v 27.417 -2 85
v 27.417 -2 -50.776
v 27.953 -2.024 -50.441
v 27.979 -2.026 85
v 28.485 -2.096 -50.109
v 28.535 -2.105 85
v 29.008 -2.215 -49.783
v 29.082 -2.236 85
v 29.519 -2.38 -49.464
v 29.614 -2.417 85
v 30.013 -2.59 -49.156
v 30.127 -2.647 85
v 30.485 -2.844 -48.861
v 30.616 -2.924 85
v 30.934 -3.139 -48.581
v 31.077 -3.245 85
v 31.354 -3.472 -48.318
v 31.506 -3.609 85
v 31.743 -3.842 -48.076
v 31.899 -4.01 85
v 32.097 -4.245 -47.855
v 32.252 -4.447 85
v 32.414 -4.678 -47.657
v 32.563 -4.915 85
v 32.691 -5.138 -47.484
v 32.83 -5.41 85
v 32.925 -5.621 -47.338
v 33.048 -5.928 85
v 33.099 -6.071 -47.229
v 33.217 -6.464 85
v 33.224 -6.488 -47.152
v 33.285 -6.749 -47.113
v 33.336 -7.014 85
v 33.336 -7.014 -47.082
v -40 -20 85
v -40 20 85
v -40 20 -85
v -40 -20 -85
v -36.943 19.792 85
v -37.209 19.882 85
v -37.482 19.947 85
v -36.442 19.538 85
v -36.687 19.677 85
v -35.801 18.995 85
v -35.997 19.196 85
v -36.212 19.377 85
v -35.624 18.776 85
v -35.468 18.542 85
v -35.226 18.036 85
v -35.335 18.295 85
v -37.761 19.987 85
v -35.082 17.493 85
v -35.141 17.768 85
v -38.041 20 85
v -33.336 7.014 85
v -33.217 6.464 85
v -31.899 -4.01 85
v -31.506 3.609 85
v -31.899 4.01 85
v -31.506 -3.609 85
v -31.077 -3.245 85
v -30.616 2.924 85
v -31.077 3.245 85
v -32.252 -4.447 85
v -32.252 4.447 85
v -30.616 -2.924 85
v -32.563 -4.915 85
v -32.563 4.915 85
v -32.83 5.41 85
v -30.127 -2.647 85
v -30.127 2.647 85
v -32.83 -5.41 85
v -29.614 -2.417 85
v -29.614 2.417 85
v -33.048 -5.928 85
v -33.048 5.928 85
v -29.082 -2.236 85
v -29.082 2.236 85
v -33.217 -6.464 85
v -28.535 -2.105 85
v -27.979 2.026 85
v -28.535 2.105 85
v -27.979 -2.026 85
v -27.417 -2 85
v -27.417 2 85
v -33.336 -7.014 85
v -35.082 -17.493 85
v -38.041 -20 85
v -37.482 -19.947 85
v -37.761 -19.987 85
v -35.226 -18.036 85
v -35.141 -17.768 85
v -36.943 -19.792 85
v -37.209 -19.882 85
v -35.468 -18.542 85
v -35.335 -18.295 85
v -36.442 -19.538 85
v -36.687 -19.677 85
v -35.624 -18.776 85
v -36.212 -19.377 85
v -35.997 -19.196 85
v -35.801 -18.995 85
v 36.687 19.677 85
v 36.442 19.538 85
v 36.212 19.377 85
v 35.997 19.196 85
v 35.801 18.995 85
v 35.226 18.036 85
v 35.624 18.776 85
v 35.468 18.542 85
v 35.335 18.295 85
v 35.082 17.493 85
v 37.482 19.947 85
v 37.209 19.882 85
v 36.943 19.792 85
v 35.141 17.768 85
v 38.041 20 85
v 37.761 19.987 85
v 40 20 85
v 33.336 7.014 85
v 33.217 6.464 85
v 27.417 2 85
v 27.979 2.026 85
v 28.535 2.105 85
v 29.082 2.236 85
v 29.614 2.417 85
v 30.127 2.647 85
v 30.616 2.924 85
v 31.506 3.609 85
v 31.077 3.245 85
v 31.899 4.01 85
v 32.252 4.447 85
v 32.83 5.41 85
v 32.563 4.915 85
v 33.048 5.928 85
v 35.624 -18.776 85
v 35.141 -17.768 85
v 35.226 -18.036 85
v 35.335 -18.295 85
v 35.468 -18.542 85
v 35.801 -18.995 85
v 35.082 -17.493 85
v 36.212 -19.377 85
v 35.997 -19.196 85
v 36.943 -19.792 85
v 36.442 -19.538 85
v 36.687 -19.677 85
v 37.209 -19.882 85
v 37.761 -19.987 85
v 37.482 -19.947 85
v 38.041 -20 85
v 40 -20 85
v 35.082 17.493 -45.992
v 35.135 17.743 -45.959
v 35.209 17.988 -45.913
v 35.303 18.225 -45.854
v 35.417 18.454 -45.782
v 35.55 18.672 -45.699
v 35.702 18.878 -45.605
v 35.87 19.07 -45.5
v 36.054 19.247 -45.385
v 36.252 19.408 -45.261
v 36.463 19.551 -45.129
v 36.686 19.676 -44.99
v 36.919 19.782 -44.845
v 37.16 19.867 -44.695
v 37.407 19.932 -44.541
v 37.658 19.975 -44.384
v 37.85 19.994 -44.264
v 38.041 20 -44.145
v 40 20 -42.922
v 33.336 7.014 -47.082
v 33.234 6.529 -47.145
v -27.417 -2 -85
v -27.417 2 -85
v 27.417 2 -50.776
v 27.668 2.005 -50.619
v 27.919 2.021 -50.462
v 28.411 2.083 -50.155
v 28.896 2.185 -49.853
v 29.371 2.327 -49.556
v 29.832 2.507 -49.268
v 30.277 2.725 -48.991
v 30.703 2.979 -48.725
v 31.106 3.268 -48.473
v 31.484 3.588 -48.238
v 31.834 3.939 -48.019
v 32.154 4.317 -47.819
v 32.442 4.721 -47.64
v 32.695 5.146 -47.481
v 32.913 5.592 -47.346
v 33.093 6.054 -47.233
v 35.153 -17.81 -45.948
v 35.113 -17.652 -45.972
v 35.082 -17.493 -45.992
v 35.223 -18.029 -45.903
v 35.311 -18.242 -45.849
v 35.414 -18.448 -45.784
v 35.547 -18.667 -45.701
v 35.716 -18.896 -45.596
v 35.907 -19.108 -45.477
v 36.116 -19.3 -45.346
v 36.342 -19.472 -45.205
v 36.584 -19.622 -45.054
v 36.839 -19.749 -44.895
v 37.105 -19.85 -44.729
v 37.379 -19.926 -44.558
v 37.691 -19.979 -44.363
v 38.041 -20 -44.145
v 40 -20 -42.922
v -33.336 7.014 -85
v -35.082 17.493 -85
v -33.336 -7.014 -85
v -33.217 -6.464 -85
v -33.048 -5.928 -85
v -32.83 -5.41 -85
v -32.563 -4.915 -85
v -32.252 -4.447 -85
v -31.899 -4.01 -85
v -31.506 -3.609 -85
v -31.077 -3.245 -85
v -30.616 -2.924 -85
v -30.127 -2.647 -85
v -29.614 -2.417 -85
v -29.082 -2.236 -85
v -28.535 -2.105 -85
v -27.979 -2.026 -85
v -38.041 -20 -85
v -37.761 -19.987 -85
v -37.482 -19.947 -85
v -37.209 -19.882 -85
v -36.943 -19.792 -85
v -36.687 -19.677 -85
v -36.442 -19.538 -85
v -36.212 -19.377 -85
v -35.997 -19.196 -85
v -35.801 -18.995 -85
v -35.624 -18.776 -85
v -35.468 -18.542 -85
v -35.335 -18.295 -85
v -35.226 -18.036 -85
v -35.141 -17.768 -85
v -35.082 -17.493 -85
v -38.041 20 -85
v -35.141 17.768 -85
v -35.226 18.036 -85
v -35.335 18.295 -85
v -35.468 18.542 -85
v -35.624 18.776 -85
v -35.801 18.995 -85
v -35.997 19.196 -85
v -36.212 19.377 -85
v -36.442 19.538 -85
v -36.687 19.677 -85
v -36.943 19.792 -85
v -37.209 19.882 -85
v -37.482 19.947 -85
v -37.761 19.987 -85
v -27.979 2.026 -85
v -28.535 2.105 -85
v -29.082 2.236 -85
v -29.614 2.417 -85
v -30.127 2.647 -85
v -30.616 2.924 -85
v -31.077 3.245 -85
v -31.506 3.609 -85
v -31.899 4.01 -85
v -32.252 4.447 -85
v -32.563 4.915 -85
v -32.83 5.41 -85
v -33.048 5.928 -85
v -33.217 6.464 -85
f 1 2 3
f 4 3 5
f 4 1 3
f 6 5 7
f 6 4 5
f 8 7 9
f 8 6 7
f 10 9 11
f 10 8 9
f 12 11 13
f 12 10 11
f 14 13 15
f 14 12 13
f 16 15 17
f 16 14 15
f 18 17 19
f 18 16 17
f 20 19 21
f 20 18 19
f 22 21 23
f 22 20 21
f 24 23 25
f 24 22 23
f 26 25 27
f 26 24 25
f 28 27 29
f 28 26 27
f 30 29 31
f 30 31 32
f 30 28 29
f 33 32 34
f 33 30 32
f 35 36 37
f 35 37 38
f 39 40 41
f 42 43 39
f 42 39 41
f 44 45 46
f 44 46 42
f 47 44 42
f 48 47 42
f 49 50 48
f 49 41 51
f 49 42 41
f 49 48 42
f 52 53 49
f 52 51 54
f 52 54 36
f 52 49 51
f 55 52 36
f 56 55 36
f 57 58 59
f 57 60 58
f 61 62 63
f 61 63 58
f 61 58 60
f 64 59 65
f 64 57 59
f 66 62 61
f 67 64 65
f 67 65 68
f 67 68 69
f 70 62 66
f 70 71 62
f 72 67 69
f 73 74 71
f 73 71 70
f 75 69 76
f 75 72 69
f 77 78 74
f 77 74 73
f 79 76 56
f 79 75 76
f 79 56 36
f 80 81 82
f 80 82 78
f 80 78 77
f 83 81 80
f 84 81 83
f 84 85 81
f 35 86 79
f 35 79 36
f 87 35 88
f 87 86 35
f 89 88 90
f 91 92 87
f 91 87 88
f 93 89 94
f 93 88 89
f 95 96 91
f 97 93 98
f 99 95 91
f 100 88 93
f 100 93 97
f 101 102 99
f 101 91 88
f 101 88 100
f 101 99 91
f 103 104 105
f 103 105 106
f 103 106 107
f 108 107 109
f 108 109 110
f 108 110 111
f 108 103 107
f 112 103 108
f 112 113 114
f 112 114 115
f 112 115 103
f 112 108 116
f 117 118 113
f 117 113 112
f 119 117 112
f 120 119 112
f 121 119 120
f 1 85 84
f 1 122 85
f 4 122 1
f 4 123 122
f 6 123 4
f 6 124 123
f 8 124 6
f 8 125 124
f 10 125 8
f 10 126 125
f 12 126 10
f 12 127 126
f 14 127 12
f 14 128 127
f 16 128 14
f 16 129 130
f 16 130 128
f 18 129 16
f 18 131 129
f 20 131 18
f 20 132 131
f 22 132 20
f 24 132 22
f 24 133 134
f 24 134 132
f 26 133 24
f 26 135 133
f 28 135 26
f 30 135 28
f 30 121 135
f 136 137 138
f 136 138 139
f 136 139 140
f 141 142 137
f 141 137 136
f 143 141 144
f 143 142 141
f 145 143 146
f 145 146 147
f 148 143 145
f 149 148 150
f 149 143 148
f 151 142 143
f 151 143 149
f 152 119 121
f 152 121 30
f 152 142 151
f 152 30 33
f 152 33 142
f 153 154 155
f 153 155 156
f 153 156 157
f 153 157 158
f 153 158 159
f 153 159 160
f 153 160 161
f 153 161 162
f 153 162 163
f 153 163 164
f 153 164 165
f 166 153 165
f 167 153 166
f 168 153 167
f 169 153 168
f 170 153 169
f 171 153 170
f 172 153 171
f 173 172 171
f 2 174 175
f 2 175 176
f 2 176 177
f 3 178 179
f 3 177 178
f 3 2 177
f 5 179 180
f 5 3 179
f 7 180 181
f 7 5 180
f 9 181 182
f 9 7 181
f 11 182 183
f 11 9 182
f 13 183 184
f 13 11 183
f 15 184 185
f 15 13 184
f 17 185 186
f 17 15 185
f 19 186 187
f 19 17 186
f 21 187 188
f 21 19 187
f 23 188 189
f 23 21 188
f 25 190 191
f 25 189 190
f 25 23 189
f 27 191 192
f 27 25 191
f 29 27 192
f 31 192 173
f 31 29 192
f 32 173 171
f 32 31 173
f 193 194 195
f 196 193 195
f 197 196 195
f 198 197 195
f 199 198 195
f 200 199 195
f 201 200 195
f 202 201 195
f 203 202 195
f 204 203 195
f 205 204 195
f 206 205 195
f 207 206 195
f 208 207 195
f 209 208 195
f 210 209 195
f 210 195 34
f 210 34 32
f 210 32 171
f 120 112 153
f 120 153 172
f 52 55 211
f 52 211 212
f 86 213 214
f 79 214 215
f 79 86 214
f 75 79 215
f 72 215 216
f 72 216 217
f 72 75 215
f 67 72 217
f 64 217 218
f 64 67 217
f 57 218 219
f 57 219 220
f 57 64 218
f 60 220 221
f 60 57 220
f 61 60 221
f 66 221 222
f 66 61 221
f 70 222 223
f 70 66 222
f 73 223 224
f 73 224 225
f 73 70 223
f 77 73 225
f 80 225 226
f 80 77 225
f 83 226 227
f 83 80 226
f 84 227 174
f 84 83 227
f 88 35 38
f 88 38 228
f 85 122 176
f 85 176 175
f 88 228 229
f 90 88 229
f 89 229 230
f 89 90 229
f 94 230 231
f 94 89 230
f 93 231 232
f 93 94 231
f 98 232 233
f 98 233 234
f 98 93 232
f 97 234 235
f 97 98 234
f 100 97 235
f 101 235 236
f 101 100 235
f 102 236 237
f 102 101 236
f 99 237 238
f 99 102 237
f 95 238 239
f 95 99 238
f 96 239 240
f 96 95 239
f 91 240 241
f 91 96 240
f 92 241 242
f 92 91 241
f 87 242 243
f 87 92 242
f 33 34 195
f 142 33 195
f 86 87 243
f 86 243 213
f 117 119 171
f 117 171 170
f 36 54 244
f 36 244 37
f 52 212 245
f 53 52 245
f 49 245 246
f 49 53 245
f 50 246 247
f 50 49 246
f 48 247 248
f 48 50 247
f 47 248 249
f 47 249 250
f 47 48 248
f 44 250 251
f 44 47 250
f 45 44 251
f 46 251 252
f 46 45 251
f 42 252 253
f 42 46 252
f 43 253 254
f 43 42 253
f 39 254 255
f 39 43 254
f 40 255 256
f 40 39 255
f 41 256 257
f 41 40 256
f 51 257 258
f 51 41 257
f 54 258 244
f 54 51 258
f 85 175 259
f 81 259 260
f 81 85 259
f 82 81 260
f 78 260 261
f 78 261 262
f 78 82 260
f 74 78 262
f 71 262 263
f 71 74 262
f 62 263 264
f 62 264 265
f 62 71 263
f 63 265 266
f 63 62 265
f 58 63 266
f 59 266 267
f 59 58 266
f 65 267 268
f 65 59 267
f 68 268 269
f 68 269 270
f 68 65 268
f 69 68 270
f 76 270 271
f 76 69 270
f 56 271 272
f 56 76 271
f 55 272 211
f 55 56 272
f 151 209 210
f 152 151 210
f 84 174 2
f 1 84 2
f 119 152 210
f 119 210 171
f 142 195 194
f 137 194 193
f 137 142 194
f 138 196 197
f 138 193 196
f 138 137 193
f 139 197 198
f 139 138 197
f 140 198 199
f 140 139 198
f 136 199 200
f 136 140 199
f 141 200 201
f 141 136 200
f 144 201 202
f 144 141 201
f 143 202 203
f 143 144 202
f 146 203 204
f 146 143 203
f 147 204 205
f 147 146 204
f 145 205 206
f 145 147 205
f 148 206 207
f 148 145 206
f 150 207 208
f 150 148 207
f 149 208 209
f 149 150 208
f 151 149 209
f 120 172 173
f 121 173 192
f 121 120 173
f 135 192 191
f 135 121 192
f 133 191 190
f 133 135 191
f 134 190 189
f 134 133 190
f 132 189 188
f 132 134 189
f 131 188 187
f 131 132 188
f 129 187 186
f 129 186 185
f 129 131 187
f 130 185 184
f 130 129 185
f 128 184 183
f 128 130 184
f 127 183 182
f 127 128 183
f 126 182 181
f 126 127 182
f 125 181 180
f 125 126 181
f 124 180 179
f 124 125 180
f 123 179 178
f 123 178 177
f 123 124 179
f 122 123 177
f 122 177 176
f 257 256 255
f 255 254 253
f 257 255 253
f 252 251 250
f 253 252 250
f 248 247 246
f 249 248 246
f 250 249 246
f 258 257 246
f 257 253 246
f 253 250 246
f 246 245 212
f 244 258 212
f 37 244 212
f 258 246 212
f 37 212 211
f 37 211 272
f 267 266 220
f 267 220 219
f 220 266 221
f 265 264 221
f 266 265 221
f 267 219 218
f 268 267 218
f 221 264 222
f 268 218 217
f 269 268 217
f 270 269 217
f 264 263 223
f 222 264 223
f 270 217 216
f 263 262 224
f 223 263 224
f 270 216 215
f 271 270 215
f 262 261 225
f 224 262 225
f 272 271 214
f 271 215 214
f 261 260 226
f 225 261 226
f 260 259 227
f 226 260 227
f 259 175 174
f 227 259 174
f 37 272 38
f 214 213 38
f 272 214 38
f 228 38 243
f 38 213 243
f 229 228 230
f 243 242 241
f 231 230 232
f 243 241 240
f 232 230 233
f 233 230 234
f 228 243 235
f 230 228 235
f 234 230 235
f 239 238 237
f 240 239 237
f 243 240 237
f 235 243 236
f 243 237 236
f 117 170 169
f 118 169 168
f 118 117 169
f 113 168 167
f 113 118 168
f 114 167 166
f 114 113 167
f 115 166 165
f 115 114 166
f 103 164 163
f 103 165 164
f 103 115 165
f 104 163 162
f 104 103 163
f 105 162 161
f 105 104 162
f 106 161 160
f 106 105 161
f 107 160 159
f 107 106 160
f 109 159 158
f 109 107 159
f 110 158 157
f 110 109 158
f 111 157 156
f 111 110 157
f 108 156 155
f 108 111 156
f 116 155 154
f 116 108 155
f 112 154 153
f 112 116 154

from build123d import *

# Parameters (mm, degrees)
VIGA_SB_80_X_6_1_DEPTH     = 170
CORTAR_EXTRUIR1_DEPTH      = 97.046863561
CORTAR_EXTRUIR1_DEPTH_BACK = 97.046863561


with BuildPart() as part:
    # Sketch1 → Viga sb 80 X 6(1) (new body)
    with BuildSketch(Plane.YX.offset(-85)):
        with BuildLine():
            Line((-20, -40), (-20, -38.041460212))
            ThreePointArc((-20, -38.041460212), (-19.289071417, -36.102349063), (-17.493231968, -35.082284275))
            Line((-17.493231968, -35.082284275), (-7.013536064, -33.335540875))
            ThreePointArc((-7.013536064, -33.335540875), (-3.421857166, -31.295411299), (-2, -27.417189001))
            Line((-2, -27.417189001), (-2, 27.417189001))
            ThreePointArc((-2, 27.417189001), (-3.421857166, 31.295411299), (-7.013536064, 33.335540875))
            Line((-7.013536064, 33.335540875), (-17.493231968, 35.082284275))
            ThreePointArc((-17.493231968, 35.082284275), (-19.289071417, 36.102349063), (-20, 38.041460212))
            Line((-20, 38.041460212), (-20, 40))
            Line((-20, 40), (20, 40))
            Line((20, 40), (20, 38.041460212))
            ThreePointArc((20, 38.041460212), (19.289071417, 36.102349063), (17.493231968, 35.082284275))
            Line((17.493231968, 35.082284275), (7.013536064, 33.335540875))
            ThreePointArc((7.013536064, 33.335540875), (3.421857166, 31.295411299), (2, 27.417189001))
            Line((2, 27.417189001), (2, -27.417189001))
            ThreePointArc((2, -27.417189001), (3.421857166, -31.295411299), (7.013536064, -33.335540875))
            Line((7.013536064, -33.335540875), (17.493231968, -35.082284275))
            ThreePointArc((17.493231968, -35.082284275), (19.289071417, -36.102349063), (20, -38.041460212))
            Line((20, -38.041460212), (20, -40))
            Line((20, -40), (-20, -40))
        make_face()
    extrude(amount=VIGA_SB_80_X_6_1_DEPTH)

    # Croquis3 → Cortar-Extruir1 (cut, two sides: drawn at the far end of the back side and taken through both)
    with BuildSketch(Plane(origin=(0, 0, 0), x_dir=(1, 0, 0), z_dir=(0, 1, 0)).offset(-CORTAR_EXTRUIR1_DEPTH_BACK)):
        Polygon((-27.417189001, 85), (71.271160363, 23.404541057), (71.271160363, 105.762435543), (-27.417189001, 105.762435543), align=None)
    extrude(amount=CORTAR_EXTRUIR1_DEPTH + CORTAR_EXTRUIR1_DEPTH_BACK, mode=Mode.SUBTRACT)


solid = part.part
